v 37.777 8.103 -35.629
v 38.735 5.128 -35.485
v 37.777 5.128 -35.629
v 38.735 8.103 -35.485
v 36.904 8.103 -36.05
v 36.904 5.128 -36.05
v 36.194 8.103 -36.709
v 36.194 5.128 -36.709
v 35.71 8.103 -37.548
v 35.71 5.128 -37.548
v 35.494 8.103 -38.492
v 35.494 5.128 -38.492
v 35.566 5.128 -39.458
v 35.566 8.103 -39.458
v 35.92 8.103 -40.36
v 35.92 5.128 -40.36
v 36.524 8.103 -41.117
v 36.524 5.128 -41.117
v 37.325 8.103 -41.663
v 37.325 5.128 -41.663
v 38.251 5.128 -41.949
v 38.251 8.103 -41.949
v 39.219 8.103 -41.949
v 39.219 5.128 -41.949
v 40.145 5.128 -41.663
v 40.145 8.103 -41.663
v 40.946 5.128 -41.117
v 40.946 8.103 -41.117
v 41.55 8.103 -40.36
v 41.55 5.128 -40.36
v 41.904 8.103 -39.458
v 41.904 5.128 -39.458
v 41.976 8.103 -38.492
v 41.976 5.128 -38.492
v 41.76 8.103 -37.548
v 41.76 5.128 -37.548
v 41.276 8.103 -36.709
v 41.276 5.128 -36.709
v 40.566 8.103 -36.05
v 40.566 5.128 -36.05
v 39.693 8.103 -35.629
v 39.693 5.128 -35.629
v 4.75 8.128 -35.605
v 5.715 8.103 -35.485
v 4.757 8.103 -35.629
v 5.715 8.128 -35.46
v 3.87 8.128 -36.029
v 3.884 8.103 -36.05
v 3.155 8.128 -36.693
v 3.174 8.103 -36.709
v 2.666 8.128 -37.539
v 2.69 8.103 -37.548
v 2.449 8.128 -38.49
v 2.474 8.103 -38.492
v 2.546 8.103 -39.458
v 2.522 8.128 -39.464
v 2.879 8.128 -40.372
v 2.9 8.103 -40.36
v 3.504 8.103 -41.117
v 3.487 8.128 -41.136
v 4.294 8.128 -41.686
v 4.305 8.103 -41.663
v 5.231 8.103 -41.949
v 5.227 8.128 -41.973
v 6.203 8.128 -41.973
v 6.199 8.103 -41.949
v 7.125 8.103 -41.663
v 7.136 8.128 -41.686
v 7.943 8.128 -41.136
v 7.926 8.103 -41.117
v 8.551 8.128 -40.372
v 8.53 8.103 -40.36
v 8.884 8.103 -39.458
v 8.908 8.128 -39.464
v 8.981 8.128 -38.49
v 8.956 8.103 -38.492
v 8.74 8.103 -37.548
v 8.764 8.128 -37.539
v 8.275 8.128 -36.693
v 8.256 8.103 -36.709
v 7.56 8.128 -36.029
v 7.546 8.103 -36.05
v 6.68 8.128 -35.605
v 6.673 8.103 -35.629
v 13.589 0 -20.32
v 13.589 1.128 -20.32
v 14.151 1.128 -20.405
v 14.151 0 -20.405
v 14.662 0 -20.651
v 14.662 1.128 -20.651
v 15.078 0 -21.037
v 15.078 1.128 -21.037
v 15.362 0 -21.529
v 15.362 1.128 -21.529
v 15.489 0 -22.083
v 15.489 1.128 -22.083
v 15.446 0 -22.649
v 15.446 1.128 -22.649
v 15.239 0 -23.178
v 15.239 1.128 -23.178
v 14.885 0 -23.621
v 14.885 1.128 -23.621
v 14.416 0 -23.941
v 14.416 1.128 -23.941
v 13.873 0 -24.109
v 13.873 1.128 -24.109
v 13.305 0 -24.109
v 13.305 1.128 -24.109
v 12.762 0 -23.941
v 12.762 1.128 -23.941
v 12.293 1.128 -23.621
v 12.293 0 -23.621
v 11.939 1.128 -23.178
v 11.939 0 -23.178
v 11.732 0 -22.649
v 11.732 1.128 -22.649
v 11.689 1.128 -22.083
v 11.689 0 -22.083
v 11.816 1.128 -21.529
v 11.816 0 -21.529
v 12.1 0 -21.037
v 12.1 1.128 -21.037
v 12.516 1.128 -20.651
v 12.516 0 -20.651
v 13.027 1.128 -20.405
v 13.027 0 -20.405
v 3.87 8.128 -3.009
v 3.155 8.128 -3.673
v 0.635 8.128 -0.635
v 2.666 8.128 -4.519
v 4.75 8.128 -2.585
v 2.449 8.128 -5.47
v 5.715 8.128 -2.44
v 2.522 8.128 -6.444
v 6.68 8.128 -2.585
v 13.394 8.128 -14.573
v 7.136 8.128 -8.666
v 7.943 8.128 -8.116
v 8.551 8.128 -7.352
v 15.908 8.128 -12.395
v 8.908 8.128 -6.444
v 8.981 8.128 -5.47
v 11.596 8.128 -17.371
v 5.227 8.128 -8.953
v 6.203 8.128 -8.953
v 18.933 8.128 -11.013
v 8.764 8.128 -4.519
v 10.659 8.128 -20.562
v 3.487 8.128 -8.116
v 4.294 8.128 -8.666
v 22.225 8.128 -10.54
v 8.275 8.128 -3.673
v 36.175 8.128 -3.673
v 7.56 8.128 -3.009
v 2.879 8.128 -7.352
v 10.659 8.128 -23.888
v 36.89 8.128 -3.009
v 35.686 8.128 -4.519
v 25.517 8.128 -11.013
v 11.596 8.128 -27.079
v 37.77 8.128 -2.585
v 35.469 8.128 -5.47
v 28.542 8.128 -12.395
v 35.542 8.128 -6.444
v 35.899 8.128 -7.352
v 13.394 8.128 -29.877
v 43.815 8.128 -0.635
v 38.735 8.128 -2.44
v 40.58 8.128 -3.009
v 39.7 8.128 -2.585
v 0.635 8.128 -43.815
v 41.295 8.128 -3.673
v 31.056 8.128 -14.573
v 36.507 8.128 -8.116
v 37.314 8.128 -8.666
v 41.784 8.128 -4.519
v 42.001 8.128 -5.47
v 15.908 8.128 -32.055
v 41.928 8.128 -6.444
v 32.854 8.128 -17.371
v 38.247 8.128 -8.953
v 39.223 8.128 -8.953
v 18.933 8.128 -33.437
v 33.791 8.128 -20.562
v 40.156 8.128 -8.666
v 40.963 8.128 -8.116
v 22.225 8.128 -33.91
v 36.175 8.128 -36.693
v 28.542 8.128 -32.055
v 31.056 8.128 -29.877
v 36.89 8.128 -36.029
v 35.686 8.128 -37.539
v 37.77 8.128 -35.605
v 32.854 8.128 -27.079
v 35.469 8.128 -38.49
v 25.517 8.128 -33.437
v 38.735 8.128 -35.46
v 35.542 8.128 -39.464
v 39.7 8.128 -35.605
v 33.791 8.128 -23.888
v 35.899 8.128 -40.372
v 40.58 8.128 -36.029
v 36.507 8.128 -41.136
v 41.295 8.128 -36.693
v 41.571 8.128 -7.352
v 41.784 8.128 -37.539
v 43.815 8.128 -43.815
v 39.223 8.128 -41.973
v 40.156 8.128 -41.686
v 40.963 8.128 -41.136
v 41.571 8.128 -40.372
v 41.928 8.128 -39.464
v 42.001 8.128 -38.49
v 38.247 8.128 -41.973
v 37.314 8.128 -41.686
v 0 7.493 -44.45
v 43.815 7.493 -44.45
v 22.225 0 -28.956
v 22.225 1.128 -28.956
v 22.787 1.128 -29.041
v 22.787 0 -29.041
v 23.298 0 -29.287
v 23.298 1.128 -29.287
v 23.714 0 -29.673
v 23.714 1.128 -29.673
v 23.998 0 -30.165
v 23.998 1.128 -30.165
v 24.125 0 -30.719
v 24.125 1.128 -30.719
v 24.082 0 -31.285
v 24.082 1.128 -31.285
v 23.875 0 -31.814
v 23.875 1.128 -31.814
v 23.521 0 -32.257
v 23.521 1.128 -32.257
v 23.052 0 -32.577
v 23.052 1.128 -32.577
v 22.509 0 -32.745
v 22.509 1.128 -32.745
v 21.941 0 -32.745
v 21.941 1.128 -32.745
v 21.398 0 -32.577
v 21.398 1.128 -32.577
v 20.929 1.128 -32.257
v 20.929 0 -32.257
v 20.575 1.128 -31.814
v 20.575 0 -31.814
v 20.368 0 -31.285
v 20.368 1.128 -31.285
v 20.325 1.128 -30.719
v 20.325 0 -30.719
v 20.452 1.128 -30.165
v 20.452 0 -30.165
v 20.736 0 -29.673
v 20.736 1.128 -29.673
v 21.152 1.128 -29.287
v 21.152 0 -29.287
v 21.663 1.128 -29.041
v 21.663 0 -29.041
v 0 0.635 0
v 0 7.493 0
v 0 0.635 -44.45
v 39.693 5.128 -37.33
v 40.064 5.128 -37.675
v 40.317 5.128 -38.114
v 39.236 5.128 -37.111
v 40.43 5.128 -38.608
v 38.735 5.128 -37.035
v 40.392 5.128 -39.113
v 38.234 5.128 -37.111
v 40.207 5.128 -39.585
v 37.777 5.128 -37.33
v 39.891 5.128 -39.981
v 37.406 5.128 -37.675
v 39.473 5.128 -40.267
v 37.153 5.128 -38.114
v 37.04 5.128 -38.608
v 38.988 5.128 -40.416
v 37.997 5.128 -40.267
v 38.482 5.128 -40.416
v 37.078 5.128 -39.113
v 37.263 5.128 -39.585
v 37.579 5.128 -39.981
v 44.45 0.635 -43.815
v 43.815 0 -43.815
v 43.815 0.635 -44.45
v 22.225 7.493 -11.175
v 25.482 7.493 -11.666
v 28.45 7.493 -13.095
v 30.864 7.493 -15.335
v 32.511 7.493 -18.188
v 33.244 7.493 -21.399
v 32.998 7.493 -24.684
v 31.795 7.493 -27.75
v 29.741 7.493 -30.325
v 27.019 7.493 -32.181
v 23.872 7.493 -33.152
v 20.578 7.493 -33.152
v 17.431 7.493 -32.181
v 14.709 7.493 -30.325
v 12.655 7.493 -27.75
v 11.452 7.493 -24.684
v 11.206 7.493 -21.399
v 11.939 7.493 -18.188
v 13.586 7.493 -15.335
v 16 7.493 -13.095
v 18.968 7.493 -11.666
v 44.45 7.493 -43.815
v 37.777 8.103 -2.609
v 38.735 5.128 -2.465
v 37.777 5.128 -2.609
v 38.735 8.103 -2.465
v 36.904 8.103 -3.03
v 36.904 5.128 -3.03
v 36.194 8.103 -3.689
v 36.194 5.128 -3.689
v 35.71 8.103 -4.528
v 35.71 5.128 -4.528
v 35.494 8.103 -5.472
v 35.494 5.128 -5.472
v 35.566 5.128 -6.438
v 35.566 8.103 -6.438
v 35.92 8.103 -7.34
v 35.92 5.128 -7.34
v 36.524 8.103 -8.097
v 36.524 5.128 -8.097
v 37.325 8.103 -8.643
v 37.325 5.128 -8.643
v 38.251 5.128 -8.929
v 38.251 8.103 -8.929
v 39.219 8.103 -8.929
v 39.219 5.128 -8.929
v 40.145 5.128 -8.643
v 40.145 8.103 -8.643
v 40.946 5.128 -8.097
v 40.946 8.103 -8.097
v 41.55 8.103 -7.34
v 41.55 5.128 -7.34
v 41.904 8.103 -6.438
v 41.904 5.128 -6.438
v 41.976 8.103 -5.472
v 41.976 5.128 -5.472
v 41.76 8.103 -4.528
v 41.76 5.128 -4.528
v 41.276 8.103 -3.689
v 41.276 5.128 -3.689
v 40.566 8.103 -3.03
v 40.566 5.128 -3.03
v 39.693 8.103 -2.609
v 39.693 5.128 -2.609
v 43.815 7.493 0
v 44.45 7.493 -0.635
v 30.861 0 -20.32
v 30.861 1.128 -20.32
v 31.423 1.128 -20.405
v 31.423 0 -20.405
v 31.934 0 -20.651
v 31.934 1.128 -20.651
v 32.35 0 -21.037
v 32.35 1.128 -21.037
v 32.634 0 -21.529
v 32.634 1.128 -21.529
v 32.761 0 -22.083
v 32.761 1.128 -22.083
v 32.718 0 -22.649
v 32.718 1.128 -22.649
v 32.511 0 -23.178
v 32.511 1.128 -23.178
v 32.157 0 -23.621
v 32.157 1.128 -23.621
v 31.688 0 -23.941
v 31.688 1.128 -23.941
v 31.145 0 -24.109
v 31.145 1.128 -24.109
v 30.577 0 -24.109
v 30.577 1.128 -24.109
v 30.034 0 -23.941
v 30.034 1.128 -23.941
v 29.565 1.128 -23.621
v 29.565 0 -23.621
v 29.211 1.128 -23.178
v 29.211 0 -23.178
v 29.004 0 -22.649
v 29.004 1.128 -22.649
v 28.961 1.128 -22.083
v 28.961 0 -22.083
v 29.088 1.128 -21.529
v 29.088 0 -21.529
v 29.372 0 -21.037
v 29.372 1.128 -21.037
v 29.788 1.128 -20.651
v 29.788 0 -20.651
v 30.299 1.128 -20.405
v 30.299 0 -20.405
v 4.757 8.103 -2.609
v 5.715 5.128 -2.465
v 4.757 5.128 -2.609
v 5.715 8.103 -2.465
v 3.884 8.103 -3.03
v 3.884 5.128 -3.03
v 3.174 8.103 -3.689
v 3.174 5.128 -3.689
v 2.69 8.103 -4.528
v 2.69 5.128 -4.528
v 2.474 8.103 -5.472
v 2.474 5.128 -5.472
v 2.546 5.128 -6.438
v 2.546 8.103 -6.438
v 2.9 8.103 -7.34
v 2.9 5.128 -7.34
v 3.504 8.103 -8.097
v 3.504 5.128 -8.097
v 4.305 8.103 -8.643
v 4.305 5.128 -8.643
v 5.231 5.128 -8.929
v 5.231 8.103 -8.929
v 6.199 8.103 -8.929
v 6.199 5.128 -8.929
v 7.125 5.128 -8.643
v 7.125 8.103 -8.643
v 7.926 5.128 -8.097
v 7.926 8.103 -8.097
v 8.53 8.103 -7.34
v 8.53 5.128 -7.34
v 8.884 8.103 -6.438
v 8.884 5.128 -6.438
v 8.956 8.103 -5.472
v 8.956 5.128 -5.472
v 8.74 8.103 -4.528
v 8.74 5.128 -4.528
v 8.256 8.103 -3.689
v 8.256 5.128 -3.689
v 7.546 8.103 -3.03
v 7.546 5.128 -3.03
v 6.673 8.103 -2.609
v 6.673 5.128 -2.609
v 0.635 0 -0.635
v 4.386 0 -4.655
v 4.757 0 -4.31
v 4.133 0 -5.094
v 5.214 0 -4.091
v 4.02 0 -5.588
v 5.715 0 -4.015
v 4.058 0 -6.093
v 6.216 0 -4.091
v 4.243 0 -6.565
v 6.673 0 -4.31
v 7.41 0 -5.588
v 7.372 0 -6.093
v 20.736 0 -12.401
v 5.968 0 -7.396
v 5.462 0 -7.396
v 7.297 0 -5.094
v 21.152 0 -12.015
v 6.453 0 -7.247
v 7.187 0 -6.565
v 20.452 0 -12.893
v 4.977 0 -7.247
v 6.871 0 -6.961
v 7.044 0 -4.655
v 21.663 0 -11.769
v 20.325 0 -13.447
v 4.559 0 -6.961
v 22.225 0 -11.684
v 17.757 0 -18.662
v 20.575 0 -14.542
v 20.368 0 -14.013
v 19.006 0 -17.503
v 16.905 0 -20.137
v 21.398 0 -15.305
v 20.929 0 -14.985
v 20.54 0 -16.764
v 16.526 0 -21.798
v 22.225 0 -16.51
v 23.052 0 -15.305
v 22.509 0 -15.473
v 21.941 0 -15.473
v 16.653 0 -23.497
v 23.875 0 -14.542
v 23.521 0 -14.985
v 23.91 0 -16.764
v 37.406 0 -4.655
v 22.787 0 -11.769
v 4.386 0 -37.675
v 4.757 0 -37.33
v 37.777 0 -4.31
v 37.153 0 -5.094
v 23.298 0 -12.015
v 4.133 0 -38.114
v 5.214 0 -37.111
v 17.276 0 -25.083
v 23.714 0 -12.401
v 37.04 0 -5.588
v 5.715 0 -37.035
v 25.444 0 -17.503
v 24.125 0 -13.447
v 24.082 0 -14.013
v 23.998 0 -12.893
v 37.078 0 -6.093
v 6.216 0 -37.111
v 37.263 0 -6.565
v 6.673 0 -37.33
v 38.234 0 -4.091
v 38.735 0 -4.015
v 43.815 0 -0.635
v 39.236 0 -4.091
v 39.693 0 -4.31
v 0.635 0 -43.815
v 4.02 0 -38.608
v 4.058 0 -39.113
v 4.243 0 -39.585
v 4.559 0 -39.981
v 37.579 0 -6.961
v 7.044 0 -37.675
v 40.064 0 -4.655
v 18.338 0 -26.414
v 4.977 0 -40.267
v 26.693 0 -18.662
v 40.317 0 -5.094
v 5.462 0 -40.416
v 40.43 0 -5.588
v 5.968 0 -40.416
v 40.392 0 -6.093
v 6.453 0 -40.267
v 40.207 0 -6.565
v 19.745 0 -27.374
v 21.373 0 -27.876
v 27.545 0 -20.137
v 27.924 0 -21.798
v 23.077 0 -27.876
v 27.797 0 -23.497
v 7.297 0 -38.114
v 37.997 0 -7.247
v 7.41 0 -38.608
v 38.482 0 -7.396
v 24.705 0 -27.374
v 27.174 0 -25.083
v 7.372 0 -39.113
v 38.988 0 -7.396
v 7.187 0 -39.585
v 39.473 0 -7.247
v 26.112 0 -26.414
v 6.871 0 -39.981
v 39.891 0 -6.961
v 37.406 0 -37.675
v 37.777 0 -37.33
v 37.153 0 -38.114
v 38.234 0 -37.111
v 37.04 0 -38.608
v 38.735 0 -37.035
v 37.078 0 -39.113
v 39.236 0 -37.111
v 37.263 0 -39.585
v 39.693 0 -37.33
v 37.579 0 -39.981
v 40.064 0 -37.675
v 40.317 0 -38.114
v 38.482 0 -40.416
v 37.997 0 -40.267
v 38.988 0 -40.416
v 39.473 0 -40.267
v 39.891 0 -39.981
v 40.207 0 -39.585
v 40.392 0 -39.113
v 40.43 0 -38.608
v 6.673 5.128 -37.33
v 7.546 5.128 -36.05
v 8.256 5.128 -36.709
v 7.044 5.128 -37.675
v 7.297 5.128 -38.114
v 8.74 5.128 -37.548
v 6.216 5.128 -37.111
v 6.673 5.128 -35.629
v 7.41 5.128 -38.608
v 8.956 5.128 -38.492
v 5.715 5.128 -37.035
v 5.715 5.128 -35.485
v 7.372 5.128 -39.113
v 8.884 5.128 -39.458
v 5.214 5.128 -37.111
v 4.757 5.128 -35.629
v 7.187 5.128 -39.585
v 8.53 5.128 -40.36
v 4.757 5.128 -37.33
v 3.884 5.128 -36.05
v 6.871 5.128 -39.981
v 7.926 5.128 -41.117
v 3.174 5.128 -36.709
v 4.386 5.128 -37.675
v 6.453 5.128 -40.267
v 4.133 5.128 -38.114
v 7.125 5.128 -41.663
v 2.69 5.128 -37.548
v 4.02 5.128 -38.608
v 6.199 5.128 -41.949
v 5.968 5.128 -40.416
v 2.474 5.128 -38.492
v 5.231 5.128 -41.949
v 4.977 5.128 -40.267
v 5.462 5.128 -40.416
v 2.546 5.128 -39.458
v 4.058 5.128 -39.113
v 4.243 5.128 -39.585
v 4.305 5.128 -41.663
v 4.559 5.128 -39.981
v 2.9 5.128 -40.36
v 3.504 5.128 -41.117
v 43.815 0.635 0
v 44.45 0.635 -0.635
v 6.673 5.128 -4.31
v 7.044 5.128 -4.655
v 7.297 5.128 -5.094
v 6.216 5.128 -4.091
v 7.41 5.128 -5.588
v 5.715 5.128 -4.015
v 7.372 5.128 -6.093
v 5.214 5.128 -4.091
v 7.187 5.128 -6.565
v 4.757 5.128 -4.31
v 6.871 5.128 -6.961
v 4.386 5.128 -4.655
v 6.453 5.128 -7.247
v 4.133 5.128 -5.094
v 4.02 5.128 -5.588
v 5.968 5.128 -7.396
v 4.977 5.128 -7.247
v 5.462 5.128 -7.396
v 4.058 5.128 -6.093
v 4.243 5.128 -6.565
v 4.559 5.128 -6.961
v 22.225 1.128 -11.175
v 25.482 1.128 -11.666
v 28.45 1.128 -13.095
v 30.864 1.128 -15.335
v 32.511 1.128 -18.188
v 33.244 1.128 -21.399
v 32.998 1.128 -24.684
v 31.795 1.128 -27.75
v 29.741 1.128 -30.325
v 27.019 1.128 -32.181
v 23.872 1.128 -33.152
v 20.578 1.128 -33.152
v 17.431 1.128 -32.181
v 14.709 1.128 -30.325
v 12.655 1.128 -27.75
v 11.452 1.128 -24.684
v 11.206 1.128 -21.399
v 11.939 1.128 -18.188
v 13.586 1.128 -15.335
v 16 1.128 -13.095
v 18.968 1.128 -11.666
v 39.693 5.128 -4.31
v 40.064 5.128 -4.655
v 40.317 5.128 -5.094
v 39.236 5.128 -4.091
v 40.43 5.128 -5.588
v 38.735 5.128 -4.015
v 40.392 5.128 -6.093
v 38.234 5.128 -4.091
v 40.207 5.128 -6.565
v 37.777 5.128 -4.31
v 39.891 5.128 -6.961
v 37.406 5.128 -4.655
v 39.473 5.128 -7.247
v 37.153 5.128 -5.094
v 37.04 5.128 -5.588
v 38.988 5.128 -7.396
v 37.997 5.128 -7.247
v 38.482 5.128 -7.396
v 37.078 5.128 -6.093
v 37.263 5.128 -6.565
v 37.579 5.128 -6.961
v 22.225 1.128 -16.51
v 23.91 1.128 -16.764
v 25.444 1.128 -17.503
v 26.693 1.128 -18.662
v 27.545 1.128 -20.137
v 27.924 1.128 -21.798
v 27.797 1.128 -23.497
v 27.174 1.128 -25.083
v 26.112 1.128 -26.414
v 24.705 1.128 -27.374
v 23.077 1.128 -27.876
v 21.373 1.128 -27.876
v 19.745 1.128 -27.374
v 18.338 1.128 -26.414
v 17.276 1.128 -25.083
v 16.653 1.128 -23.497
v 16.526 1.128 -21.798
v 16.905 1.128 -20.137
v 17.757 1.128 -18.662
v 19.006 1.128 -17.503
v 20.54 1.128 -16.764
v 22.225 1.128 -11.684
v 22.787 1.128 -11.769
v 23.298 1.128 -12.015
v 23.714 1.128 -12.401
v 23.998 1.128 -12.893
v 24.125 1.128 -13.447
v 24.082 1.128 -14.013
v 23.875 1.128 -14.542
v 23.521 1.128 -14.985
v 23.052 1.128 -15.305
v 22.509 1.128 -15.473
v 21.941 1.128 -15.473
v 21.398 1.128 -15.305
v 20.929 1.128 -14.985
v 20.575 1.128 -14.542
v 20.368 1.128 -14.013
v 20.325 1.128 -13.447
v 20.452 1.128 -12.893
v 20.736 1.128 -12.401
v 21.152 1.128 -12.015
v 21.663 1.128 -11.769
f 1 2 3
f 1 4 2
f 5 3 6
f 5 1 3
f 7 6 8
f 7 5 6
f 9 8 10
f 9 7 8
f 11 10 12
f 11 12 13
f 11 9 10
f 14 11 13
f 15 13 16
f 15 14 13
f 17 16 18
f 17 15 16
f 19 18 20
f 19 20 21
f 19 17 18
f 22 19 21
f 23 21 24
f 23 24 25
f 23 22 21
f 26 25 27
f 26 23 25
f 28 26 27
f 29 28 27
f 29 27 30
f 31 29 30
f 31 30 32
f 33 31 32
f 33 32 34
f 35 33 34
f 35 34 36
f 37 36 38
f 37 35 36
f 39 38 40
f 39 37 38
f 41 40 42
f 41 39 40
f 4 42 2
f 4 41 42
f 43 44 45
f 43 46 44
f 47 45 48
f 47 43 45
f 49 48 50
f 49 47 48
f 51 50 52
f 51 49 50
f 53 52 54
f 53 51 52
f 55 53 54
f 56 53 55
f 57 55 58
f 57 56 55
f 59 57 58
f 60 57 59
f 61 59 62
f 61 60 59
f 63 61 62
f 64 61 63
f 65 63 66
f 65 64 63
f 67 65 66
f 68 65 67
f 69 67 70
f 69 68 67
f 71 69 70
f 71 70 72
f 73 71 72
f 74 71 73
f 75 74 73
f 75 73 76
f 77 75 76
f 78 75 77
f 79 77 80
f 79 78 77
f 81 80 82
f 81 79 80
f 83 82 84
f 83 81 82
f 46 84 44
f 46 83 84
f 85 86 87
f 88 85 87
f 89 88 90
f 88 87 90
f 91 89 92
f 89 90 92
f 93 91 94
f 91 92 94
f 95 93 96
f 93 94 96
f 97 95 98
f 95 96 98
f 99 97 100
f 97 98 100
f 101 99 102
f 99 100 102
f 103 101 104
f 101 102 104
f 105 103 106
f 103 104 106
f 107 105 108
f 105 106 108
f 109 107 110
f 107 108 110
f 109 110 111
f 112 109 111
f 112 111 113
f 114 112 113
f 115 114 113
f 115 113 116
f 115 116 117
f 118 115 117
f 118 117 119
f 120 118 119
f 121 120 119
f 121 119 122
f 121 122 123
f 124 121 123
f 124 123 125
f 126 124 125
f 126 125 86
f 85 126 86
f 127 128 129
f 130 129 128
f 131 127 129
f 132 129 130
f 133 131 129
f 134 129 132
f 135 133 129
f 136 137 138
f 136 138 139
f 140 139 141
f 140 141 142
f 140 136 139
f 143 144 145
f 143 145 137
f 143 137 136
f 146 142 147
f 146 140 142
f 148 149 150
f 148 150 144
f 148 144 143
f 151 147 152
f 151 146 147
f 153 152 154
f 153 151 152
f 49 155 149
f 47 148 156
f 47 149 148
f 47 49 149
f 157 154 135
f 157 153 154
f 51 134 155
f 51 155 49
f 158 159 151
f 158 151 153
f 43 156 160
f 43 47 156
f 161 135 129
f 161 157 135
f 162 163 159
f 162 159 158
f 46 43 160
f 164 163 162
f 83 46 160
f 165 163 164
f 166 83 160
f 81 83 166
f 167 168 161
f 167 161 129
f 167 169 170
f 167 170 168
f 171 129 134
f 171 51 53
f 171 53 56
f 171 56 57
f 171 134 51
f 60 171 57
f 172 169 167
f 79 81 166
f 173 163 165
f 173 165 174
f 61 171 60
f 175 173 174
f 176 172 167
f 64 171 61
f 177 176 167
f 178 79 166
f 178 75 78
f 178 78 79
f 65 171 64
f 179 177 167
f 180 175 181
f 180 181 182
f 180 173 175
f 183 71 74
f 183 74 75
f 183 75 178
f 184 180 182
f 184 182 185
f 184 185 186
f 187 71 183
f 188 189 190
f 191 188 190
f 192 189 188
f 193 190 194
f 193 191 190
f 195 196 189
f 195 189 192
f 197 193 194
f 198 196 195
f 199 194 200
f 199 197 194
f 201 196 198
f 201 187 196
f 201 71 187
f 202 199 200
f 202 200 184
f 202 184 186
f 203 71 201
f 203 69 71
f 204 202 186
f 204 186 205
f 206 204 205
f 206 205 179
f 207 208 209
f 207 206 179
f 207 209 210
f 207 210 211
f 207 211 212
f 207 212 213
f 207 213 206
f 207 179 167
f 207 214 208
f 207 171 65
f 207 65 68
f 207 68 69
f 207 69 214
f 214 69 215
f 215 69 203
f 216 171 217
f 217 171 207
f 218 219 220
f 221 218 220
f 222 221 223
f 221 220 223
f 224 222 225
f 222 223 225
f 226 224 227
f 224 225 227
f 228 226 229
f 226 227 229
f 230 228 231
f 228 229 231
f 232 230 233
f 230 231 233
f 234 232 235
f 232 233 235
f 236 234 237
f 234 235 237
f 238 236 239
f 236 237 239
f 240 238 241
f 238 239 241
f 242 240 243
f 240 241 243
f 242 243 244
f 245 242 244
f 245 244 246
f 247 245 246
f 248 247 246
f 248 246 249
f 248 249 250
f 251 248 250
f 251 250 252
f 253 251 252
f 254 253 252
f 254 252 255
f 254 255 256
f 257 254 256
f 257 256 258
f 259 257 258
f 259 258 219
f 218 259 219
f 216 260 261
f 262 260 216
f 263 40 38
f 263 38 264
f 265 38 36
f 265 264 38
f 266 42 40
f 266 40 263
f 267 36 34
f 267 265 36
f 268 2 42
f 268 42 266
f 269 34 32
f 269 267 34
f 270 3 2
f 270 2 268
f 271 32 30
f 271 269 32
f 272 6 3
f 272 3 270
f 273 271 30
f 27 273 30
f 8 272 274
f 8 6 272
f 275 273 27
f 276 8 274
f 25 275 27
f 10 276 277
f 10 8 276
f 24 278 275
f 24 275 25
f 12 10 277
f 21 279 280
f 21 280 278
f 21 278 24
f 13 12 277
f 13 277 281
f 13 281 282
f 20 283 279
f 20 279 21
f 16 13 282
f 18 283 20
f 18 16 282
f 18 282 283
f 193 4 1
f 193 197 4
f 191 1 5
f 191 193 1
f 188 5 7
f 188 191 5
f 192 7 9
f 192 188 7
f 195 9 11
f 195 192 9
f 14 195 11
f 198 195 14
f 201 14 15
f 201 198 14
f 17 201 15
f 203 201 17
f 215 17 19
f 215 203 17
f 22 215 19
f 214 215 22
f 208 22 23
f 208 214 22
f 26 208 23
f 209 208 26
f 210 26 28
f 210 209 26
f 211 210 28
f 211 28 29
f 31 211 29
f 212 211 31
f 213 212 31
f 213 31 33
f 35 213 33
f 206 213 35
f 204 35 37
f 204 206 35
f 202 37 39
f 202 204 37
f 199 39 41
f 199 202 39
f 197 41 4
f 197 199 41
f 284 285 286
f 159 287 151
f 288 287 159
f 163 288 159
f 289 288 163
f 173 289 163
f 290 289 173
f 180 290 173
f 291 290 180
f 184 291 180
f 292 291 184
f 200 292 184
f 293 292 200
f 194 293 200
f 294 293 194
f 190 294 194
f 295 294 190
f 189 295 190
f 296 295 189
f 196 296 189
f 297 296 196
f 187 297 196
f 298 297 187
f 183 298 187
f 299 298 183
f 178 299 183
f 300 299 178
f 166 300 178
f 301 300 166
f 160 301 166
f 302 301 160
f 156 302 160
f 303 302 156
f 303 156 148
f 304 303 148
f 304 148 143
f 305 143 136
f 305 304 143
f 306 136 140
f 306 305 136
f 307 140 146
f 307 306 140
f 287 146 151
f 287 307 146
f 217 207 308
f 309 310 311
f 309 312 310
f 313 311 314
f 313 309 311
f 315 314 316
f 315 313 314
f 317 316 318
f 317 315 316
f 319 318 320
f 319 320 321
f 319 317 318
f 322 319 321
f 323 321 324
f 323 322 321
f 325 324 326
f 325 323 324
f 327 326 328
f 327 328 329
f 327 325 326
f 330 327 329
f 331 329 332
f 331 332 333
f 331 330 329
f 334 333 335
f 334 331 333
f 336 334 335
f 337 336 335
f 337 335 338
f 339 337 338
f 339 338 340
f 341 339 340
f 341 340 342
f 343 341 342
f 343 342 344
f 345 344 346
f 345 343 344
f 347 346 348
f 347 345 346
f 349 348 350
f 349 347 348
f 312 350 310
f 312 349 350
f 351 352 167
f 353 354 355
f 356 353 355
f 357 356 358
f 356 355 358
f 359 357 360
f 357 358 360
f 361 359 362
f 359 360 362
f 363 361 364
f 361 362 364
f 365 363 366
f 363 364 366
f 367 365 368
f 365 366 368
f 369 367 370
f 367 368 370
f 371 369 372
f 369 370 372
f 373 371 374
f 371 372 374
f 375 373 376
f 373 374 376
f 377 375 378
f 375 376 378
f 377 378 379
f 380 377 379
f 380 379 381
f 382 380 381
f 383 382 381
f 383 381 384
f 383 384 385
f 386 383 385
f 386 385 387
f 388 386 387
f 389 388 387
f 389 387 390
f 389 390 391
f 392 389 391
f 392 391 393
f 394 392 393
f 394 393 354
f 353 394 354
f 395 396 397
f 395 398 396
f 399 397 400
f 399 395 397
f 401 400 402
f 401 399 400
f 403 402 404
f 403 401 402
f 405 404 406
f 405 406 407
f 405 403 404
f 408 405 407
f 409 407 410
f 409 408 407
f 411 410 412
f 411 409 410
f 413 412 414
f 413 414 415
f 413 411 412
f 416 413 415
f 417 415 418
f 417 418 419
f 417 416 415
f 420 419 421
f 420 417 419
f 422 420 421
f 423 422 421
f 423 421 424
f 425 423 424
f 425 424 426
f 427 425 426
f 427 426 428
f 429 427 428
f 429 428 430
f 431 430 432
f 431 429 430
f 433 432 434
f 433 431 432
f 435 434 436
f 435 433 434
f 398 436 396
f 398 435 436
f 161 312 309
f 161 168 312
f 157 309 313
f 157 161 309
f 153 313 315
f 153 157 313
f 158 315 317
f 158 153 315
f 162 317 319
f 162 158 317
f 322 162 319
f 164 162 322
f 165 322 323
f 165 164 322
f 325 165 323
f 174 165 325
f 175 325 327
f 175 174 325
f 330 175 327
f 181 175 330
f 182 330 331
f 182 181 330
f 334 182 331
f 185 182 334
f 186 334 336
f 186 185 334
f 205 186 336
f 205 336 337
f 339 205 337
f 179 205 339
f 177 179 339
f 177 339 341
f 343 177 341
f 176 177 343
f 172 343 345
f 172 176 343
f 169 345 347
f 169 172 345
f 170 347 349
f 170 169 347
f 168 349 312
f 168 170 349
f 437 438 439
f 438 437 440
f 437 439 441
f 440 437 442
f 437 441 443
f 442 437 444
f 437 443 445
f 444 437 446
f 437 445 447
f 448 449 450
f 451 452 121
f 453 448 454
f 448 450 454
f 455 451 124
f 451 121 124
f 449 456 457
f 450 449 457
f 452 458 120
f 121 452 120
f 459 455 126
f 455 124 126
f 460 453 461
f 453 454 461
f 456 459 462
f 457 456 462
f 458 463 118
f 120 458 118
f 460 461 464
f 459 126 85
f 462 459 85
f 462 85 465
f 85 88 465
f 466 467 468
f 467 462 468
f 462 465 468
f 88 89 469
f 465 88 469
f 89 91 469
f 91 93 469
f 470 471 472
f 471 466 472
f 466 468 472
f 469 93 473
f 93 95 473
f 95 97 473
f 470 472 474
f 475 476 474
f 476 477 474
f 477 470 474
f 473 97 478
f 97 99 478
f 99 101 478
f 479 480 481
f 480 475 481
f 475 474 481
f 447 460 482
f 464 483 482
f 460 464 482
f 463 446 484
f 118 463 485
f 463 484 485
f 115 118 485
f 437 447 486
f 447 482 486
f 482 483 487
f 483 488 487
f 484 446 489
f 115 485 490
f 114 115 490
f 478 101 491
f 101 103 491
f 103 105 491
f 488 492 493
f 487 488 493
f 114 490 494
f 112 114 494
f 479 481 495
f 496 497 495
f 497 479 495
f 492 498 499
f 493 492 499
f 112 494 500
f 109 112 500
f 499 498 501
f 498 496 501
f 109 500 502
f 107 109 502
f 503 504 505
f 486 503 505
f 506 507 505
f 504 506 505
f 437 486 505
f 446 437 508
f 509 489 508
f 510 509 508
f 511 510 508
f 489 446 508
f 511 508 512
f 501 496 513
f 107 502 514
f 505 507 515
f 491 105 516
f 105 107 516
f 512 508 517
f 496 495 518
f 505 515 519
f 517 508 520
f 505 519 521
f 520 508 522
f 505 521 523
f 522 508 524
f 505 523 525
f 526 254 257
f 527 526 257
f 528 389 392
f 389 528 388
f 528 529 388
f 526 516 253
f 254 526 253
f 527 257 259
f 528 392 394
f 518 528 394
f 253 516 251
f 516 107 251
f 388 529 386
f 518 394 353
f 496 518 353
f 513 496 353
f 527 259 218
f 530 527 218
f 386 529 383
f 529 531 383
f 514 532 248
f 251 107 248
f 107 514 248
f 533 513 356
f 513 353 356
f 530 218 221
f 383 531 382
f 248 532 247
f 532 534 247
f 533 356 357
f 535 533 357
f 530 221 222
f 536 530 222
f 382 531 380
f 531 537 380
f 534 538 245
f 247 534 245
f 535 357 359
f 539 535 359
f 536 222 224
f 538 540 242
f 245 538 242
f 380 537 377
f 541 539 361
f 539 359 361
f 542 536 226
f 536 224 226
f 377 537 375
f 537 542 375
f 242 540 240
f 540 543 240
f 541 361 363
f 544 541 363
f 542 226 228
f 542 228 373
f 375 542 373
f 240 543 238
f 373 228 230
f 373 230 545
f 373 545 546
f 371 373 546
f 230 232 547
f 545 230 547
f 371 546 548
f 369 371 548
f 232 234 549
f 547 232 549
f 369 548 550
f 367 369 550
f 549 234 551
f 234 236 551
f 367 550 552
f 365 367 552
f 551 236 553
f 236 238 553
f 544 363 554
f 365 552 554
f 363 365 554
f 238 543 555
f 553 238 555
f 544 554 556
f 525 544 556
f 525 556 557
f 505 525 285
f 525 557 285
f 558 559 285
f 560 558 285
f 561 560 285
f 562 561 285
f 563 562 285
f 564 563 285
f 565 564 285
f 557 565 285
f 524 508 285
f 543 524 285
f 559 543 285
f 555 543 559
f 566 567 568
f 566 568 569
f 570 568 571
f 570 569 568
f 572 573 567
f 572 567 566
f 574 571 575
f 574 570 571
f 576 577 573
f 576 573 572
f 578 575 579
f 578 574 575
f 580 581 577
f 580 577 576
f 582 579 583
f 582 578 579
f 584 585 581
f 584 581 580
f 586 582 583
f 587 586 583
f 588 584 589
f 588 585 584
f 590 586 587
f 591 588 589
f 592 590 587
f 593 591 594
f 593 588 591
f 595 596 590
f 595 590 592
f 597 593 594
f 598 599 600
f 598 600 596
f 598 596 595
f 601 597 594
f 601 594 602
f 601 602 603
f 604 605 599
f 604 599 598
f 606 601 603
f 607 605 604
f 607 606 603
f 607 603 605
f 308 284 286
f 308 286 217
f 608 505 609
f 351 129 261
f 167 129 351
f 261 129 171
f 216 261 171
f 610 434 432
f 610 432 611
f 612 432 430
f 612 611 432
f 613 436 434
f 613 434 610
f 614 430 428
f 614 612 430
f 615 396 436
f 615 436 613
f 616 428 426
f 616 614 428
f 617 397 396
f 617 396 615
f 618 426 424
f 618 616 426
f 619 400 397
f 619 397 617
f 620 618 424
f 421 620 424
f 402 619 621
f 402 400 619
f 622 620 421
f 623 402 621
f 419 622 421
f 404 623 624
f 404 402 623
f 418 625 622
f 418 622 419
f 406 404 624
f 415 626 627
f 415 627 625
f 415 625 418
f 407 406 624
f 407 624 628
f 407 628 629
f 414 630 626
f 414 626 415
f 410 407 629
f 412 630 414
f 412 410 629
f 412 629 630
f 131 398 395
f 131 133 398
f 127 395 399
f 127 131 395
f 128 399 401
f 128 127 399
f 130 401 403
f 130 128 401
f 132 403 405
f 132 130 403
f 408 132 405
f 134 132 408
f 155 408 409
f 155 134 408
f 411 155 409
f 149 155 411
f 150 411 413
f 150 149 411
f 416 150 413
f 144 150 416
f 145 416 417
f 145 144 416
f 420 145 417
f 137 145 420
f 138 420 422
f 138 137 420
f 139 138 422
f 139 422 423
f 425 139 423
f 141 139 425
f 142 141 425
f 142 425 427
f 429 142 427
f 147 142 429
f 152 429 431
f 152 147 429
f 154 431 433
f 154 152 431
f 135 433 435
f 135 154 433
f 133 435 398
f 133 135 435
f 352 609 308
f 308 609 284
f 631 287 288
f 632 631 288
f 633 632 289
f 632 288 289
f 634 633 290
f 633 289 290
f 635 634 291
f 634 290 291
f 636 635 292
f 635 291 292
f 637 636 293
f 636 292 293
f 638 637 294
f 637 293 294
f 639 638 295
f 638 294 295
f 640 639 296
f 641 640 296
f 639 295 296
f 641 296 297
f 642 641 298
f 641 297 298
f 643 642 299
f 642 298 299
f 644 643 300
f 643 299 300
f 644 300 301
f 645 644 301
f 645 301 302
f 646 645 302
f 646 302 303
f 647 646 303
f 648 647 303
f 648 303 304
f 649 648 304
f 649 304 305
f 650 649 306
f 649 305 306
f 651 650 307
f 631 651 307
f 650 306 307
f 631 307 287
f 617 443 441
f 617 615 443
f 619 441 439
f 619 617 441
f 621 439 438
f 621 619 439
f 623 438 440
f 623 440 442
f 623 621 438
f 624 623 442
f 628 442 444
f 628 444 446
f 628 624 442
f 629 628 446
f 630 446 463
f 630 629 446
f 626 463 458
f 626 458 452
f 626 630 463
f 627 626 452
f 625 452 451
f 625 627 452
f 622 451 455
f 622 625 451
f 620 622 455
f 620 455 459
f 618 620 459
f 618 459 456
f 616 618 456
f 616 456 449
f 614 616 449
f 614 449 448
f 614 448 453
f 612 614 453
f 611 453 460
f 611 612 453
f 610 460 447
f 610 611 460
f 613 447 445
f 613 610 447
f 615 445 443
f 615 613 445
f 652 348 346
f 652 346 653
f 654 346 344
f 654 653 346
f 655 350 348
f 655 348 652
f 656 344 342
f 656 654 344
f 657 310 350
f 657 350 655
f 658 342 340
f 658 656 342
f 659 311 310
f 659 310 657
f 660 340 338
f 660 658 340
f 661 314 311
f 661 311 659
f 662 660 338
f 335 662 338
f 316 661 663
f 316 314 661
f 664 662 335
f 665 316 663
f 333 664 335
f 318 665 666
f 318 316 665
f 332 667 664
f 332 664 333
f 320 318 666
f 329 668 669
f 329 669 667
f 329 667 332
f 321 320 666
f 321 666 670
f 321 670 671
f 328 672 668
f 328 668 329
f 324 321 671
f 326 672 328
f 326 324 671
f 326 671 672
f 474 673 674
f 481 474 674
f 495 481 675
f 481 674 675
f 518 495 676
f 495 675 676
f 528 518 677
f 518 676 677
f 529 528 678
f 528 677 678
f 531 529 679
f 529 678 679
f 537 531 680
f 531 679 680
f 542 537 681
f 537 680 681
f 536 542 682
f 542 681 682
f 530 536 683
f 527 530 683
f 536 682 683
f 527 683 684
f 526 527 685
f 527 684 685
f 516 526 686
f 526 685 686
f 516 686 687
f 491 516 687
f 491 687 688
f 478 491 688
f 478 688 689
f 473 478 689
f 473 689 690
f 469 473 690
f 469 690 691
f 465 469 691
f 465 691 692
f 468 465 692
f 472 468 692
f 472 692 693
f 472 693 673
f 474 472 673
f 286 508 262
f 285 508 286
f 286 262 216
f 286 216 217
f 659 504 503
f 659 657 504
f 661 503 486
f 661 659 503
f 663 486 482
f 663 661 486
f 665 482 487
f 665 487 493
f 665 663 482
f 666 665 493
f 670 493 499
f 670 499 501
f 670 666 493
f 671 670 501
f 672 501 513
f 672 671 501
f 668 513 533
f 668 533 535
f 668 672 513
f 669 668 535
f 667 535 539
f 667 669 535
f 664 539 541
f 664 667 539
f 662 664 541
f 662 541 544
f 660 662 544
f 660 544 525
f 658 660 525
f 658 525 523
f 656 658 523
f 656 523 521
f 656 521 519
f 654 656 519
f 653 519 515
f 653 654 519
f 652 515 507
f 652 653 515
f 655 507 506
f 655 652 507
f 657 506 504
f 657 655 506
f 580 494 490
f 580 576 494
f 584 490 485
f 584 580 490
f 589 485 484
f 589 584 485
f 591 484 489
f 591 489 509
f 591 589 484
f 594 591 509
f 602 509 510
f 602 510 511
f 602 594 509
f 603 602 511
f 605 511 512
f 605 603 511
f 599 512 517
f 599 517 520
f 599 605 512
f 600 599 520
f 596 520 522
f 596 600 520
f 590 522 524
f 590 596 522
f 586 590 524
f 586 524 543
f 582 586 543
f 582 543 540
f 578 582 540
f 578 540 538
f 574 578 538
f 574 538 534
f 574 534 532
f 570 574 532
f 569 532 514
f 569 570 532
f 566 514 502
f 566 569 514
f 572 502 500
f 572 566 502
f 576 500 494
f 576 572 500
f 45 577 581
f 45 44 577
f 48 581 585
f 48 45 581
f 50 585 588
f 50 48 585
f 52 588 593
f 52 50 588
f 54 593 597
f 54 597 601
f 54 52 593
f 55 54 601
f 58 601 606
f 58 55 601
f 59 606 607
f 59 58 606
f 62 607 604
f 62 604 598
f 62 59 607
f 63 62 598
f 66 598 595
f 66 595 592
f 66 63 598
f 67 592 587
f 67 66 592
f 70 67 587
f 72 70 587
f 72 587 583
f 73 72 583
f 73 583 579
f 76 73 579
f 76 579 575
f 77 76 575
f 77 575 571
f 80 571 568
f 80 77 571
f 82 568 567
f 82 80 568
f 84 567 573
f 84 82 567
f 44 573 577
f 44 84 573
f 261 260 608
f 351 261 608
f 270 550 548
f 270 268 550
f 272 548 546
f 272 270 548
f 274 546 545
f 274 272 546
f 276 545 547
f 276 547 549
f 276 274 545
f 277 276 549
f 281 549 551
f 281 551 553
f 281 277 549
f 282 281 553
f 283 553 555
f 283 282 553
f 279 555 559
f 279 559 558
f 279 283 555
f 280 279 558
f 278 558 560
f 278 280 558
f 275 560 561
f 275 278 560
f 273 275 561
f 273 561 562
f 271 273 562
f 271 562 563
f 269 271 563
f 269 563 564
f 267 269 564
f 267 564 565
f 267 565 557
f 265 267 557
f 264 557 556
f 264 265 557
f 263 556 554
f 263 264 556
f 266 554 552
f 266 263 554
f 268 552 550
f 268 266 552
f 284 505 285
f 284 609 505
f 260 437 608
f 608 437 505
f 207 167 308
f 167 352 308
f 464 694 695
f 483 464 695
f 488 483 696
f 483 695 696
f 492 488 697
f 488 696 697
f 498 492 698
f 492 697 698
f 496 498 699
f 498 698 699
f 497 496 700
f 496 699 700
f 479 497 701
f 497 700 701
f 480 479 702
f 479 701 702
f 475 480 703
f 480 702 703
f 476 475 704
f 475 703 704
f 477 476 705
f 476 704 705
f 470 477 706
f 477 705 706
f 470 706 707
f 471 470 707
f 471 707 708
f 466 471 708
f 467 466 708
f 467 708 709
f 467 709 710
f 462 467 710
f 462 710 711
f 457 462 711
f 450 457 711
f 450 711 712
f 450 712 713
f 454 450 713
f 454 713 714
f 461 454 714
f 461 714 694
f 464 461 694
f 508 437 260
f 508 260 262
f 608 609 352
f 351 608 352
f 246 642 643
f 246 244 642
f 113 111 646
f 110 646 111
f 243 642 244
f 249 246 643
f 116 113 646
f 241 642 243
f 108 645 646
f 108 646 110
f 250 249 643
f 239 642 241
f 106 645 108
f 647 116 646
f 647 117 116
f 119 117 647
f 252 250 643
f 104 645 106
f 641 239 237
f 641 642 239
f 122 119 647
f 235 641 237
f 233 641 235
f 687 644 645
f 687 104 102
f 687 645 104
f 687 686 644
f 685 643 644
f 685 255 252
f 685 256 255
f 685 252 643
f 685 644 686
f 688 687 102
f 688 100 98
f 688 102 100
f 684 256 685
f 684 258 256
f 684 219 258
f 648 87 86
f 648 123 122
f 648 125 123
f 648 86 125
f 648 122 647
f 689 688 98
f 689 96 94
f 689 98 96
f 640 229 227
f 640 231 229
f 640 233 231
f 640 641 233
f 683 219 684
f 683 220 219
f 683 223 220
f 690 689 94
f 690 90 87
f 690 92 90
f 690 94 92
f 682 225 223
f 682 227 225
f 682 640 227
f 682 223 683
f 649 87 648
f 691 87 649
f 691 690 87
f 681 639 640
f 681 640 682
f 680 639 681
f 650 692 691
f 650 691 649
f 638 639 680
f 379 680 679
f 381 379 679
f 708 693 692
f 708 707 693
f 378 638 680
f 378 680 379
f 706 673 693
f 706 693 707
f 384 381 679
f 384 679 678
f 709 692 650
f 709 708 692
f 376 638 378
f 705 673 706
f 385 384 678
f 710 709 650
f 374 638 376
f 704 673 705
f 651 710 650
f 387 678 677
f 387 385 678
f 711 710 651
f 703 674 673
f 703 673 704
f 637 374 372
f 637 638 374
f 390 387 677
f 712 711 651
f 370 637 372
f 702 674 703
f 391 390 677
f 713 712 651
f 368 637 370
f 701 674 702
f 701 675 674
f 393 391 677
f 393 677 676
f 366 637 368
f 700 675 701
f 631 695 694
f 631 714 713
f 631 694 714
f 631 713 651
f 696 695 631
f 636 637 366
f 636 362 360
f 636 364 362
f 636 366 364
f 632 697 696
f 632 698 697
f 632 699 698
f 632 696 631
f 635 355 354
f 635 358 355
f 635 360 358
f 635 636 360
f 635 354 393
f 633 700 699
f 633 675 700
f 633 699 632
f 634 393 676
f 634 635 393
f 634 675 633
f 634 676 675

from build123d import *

# Parameters (mm, degrees)
SKETCH1_W                     = 44.45
SKETCH1_H                     = 44.45
BOSS_EXTRUDE1_DEPTH           = 8.128
SKETCH2_R                     = 11.05
CUT_EXTRUDE1_DEPTH            = 7
SKETCH3_R                     = 1.905
SKETCH3_R_2                   = 5.715
CUT_EXTRUDE2_DEPTH            = 64.250335967
CBORE_FOR_M3_SHCS1_AT_2_COUNT = 2
CBORE_FOR_M3_SHCS1_AT_2_PITCH = 33.02
CBORE_FOR_M3_SHCS1_AT_3_COUNT = 2
CBORE_FOR_M3_SHCS1_AT_3_PITCH = 46.69733183
CBORE_FOR_M3_SHCS1_AT_4_COUNT = 2
CBORE_FOR_M3_SHCS1_AT_4_PITCH = 33.02
CHAMFER1_SIZE                 = 0.635
CHAMFER2_SIZE                 = 0.635


with BuildPart() as part:
    # Sketch1 → Boss-Extrude1 (new body)
    with BuildSketch(Plane(origin=(0, 0, 0), x_dir=(1, 0, 0), z_dir=(0, 1, 0))):
        with Locations((22.225, 22.225)):
            Rectangle(SKETCH1_W, SKETCH1_H)
    extrude(amount=BOSS_EXTRUDE1_DEPTH)

    # Sketch2 → Cut-Extrude1 (cut)
    with BuildSketch(Plane(origin=(0, 8.128, 0), x_dir=(1, 0, 0), z_dir=(0, 1, 0))):
        with Locations(Location((22.225, 22.225, 0), (0, 0, 270))):
            Circle(SKETCH2_R)
    extrude(amount=-CUT_EXTRUDE1_DEPTH, mode=Mode.SUBTRACT)

    # Sketch3 → Cut-Extrude2 (cut, through all)
    with BuildSketch(Plane(origin=(0, 1.128, 0), x_dir=(1, 0, 0), z_dir=(0, 1, 0))):
        with Locations(Location((22.225, 30.861, 0), (0, 0, 270))):
            Circle(SKETCH3_R)
        with Locations(Location((30.861, 22.225, 0), (0, 0, 270))):
            Circle(SKETCH3_R)
        with Locations(Location((22.225, 13.589, 0), (0, 0, 270))):
            Circle(SKETCH3_R)
        with Locations(Location((13.589, 22.225, 0), (0, 0, 270))):
            Circle(SKETCH3_R)
        with Locations(Location((22.225, 22.225, 0), (0, 0, 270))):
            Circle(SKETCH3_R_2)
    extrude(amount=-CUT_EXTRUDE2_DEPTH, mode=Mode.SUBTRACT)

    # Sketch8 → CBORE for M3 SHCS1 (revolve, cut)
    with BuildSketch(Plane(origin=(5.715, 8.128, -38.735), x_dir=(0, 0, 1), z_dir=(1, 0, 0))):
        Polygon((0, 0), (0, 8.128), (1.7, 8.128), (1.7, 3), (3.25, 3), (3.25, 0.025), (3.275, 0), align=None)
    cbore_for_m3_shcs1 = revolve(axis=Axis((5.715, 14.478, -38.735), (0, -1, 0)), mode=Mode.SUBTRACT)

    # CBORE for M3 SHCS1 at 2: CBORE for M3 SHCS1 ×2
    with Locations(*[(i * CBORE_FOR_M3_SHCS1_AT_2_PITCH, 0, 0) for i in range(1, CBORE_FOR_M3_SHCS1_AT_2_COUNT)]):
        add(cbore_for_m3_shcs1, mode=Mode.SUBTRACT)

    # CBORE for M3 SHCS1 at 3: CBORE for M3 SHCS1 ×2
    with Locations(*[Vector(0.7071067811865477, 0, 0.7071067811865475) * (i * CBORE_FOR_M3_SHCS1_AT_3_PITCH) for i in range(1, CBORE_FOR_M3_SHCS1_AT_3_COUNT)]):
        add(cbore_for_m3_shcs1, mode=Mode.SUBTRACT)

    # CBORE for M3 SHCS1 at 4: CBORE for M3 SHCS1 ×2
    with Locations(*[(0, 0, i * CBORE_FOR_M3_SHCS1_AT_4_PITCH) for i in range(1, CBORE_FOR_M3_SHCS1_AT_4_COUNT)]):
        add(cbore_for_m3_shcs1, mode=Mode.SUBTRACT)

    # Chamfer1
    chamfer1_edges = [part.edges().sort_by_distance(p)[0] for p in [
        (44.45, 8.128, -22.225),
        (22.225, 8.128, -44.45),
        (0, 8.128, -22.225),
        (22.225, 0, -44.45),
        (44.45, 0, -22.225),
        (22.225, 0, 0),
        (0, 0, -22.225),
        (44.45, 4.064, -44.45),
        (44.45, 4.064, 0),
        (22.225, 8.128, 0),
    ]]
    chamfer(chamfer1_edges, length=CHAMFER1_SIZE)

    # Chamfer2
    chamfer2_edges = [part.edges().sort_by_distance(p)[0] for p in [
        (22.225, 8.128, -33.275),
    ]]
    chamfer(chamfer2_edges, length=CHAMFER2_SIZE)


solid = part.part
